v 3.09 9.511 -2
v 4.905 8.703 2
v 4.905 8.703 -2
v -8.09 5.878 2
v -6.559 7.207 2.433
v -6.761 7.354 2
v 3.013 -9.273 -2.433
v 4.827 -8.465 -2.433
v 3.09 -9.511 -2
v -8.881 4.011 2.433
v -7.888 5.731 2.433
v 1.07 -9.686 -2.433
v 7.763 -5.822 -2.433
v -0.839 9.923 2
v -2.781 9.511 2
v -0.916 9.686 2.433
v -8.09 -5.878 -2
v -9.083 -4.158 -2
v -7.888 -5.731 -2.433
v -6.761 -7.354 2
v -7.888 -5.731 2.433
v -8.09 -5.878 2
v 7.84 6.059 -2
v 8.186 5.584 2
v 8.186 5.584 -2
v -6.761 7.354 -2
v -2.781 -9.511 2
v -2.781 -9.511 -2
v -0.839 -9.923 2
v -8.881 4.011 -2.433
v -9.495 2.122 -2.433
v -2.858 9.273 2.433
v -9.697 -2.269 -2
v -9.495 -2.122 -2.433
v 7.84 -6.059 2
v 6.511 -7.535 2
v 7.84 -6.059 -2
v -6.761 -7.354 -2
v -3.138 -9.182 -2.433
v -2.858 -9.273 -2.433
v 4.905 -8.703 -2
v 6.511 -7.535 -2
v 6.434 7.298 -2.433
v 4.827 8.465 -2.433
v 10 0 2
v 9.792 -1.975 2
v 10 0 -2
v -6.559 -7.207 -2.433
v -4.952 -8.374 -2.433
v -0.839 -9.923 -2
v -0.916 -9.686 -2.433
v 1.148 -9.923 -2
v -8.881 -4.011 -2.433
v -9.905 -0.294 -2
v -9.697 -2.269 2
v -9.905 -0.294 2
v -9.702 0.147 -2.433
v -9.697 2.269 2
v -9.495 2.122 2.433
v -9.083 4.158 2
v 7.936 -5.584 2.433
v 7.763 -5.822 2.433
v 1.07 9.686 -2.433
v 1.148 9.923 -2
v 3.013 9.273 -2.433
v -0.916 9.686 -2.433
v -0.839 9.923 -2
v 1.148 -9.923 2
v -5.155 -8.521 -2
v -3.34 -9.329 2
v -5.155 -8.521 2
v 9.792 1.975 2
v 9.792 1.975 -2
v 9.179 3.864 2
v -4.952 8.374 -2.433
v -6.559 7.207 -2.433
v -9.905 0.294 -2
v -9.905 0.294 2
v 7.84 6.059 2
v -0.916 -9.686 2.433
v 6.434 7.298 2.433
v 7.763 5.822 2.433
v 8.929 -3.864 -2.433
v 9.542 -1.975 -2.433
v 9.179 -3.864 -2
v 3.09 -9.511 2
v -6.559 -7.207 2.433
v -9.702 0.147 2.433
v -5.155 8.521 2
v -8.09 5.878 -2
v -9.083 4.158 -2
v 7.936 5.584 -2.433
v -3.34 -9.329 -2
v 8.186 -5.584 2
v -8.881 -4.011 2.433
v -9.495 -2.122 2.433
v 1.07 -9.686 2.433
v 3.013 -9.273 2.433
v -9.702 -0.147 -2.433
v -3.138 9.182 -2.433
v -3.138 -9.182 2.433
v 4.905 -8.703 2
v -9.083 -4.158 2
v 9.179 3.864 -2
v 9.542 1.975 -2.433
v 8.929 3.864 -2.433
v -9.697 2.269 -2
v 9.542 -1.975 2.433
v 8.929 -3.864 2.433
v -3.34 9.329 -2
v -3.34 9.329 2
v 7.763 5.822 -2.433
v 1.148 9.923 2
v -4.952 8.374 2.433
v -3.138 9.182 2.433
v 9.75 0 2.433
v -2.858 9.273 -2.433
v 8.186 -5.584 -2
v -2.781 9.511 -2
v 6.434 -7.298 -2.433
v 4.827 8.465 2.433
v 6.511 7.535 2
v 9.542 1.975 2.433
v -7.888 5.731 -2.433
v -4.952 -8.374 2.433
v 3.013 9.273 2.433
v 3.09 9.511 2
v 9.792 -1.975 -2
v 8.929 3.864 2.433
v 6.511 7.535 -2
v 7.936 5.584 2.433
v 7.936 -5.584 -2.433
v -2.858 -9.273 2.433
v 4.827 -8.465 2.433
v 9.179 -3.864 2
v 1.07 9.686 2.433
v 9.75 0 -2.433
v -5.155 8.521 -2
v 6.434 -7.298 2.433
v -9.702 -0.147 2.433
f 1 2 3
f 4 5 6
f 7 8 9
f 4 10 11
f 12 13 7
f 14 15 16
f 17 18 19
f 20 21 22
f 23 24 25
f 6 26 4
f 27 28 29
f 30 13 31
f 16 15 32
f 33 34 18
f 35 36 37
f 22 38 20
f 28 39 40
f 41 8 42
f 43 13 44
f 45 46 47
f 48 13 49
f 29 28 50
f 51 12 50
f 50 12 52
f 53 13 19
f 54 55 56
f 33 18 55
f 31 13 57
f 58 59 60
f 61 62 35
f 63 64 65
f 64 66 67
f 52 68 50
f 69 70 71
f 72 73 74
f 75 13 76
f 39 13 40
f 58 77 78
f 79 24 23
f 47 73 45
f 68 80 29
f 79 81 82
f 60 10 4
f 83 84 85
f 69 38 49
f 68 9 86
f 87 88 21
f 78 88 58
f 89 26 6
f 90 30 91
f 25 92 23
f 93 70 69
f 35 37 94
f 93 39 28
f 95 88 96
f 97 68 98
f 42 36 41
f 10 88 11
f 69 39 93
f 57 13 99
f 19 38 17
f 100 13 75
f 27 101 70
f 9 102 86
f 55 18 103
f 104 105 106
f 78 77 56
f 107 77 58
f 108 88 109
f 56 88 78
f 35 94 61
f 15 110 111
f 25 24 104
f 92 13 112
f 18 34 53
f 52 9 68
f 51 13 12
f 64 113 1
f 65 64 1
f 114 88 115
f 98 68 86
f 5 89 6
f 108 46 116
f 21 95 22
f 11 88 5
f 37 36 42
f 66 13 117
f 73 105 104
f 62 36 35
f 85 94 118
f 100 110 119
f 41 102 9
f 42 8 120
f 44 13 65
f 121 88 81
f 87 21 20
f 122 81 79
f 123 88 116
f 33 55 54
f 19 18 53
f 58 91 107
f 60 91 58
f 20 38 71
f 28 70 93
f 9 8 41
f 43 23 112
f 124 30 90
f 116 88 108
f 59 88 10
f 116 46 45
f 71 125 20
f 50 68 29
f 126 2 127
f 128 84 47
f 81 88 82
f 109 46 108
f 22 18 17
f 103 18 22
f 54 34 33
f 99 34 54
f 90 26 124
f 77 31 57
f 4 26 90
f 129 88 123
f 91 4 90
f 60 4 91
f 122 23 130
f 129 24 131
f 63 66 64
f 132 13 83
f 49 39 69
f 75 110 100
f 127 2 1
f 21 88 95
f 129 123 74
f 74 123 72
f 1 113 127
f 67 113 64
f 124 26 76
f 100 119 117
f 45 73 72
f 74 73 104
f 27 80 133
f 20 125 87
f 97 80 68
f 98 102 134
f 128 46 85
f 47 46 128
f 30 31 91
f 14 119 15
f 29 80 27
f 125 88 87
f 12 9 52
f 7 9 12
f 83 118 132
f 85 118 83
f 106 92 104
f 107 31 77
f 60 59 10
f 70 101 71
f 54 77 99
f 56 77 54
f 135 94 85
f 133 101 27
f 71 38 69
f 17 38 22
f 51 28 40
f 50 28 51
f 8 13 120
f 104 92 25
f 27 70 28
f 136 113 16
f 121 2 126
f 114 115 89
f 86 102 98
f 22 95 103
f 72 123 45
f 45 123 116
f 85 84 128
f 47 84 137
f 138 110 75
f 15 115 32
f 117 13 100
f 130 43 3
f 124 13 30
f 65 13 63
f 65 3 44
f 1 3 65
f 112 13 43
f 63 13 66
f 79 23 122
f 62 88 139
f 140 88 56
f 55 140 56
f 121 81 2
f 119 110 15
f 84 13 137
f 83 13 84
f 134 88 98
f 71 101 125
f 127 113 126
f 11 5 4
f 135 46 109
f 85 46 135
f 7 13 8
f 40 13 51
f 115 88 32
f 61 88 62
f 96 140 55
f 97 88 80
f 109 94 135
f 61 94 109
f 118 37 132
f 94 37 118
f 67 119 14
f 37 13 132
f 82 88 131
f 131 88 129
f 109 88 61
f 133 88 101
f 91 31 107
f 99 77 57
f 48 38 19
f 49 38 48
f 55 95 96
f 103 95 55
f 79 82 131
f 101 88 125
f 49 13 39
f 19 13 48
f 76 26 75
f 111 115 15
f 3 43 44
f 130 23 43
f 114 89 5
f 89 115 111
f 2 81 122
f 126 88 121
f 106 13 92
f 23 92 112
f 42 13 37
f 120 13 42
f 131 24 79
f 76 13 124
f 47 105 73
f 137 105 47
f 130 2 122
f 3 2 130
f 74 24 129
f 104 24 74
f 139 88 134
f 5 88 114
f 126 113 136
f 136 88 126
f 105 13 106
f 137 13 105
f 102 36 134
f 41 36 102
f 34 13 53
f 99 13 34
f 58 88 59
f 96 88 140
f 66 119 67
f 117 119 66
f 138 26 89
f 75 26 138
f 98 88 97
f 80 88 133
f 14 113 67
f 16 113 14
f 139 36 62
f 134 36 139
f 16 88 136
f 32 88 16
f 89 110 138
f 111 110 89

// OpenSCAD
// Parameters
magnet_type = 0; //[0:20:1]
outer_diameter_mm = 20; //[10:40:1]
inner_diameter_mm = 0; //[0:20:1]
height_mm = 5; //[2.5:10:0.5]
edge_radius_mm = 0.5; //[0:2:0.1]
bore_clearance_mm = 0.2; //[0:1:0.05]
bore_height_extra_mm = 2; //[1:6:0.5]

// Magnet - complete geometry
module magnet() {
  color([0.72, 0.45, 0.2]) { // Copper color for magnet
    difference() {
      // Magnet body with edge rounding
      minkowski() {
        // Raw magnet body
        cylinder(r=outer_diameter_mm/2 - edge_radius_mm, h=height_mm - 2*edge_radius_mm, center=true);
        // Edge rounding sphere
        sphere(r=edge_radius_mm, center=true);
      }
      // Optional center bore
      if (inner_diameter_mm > 0) {
        cylinder(r=(inner_diameter_mm + bore_clearance_mm)/2, h=height_mm + bore_height_extra_mm, center=true);
      }
    }
  }
}

// Assembly
module assembly() {
  magnet();
}

assembly();
